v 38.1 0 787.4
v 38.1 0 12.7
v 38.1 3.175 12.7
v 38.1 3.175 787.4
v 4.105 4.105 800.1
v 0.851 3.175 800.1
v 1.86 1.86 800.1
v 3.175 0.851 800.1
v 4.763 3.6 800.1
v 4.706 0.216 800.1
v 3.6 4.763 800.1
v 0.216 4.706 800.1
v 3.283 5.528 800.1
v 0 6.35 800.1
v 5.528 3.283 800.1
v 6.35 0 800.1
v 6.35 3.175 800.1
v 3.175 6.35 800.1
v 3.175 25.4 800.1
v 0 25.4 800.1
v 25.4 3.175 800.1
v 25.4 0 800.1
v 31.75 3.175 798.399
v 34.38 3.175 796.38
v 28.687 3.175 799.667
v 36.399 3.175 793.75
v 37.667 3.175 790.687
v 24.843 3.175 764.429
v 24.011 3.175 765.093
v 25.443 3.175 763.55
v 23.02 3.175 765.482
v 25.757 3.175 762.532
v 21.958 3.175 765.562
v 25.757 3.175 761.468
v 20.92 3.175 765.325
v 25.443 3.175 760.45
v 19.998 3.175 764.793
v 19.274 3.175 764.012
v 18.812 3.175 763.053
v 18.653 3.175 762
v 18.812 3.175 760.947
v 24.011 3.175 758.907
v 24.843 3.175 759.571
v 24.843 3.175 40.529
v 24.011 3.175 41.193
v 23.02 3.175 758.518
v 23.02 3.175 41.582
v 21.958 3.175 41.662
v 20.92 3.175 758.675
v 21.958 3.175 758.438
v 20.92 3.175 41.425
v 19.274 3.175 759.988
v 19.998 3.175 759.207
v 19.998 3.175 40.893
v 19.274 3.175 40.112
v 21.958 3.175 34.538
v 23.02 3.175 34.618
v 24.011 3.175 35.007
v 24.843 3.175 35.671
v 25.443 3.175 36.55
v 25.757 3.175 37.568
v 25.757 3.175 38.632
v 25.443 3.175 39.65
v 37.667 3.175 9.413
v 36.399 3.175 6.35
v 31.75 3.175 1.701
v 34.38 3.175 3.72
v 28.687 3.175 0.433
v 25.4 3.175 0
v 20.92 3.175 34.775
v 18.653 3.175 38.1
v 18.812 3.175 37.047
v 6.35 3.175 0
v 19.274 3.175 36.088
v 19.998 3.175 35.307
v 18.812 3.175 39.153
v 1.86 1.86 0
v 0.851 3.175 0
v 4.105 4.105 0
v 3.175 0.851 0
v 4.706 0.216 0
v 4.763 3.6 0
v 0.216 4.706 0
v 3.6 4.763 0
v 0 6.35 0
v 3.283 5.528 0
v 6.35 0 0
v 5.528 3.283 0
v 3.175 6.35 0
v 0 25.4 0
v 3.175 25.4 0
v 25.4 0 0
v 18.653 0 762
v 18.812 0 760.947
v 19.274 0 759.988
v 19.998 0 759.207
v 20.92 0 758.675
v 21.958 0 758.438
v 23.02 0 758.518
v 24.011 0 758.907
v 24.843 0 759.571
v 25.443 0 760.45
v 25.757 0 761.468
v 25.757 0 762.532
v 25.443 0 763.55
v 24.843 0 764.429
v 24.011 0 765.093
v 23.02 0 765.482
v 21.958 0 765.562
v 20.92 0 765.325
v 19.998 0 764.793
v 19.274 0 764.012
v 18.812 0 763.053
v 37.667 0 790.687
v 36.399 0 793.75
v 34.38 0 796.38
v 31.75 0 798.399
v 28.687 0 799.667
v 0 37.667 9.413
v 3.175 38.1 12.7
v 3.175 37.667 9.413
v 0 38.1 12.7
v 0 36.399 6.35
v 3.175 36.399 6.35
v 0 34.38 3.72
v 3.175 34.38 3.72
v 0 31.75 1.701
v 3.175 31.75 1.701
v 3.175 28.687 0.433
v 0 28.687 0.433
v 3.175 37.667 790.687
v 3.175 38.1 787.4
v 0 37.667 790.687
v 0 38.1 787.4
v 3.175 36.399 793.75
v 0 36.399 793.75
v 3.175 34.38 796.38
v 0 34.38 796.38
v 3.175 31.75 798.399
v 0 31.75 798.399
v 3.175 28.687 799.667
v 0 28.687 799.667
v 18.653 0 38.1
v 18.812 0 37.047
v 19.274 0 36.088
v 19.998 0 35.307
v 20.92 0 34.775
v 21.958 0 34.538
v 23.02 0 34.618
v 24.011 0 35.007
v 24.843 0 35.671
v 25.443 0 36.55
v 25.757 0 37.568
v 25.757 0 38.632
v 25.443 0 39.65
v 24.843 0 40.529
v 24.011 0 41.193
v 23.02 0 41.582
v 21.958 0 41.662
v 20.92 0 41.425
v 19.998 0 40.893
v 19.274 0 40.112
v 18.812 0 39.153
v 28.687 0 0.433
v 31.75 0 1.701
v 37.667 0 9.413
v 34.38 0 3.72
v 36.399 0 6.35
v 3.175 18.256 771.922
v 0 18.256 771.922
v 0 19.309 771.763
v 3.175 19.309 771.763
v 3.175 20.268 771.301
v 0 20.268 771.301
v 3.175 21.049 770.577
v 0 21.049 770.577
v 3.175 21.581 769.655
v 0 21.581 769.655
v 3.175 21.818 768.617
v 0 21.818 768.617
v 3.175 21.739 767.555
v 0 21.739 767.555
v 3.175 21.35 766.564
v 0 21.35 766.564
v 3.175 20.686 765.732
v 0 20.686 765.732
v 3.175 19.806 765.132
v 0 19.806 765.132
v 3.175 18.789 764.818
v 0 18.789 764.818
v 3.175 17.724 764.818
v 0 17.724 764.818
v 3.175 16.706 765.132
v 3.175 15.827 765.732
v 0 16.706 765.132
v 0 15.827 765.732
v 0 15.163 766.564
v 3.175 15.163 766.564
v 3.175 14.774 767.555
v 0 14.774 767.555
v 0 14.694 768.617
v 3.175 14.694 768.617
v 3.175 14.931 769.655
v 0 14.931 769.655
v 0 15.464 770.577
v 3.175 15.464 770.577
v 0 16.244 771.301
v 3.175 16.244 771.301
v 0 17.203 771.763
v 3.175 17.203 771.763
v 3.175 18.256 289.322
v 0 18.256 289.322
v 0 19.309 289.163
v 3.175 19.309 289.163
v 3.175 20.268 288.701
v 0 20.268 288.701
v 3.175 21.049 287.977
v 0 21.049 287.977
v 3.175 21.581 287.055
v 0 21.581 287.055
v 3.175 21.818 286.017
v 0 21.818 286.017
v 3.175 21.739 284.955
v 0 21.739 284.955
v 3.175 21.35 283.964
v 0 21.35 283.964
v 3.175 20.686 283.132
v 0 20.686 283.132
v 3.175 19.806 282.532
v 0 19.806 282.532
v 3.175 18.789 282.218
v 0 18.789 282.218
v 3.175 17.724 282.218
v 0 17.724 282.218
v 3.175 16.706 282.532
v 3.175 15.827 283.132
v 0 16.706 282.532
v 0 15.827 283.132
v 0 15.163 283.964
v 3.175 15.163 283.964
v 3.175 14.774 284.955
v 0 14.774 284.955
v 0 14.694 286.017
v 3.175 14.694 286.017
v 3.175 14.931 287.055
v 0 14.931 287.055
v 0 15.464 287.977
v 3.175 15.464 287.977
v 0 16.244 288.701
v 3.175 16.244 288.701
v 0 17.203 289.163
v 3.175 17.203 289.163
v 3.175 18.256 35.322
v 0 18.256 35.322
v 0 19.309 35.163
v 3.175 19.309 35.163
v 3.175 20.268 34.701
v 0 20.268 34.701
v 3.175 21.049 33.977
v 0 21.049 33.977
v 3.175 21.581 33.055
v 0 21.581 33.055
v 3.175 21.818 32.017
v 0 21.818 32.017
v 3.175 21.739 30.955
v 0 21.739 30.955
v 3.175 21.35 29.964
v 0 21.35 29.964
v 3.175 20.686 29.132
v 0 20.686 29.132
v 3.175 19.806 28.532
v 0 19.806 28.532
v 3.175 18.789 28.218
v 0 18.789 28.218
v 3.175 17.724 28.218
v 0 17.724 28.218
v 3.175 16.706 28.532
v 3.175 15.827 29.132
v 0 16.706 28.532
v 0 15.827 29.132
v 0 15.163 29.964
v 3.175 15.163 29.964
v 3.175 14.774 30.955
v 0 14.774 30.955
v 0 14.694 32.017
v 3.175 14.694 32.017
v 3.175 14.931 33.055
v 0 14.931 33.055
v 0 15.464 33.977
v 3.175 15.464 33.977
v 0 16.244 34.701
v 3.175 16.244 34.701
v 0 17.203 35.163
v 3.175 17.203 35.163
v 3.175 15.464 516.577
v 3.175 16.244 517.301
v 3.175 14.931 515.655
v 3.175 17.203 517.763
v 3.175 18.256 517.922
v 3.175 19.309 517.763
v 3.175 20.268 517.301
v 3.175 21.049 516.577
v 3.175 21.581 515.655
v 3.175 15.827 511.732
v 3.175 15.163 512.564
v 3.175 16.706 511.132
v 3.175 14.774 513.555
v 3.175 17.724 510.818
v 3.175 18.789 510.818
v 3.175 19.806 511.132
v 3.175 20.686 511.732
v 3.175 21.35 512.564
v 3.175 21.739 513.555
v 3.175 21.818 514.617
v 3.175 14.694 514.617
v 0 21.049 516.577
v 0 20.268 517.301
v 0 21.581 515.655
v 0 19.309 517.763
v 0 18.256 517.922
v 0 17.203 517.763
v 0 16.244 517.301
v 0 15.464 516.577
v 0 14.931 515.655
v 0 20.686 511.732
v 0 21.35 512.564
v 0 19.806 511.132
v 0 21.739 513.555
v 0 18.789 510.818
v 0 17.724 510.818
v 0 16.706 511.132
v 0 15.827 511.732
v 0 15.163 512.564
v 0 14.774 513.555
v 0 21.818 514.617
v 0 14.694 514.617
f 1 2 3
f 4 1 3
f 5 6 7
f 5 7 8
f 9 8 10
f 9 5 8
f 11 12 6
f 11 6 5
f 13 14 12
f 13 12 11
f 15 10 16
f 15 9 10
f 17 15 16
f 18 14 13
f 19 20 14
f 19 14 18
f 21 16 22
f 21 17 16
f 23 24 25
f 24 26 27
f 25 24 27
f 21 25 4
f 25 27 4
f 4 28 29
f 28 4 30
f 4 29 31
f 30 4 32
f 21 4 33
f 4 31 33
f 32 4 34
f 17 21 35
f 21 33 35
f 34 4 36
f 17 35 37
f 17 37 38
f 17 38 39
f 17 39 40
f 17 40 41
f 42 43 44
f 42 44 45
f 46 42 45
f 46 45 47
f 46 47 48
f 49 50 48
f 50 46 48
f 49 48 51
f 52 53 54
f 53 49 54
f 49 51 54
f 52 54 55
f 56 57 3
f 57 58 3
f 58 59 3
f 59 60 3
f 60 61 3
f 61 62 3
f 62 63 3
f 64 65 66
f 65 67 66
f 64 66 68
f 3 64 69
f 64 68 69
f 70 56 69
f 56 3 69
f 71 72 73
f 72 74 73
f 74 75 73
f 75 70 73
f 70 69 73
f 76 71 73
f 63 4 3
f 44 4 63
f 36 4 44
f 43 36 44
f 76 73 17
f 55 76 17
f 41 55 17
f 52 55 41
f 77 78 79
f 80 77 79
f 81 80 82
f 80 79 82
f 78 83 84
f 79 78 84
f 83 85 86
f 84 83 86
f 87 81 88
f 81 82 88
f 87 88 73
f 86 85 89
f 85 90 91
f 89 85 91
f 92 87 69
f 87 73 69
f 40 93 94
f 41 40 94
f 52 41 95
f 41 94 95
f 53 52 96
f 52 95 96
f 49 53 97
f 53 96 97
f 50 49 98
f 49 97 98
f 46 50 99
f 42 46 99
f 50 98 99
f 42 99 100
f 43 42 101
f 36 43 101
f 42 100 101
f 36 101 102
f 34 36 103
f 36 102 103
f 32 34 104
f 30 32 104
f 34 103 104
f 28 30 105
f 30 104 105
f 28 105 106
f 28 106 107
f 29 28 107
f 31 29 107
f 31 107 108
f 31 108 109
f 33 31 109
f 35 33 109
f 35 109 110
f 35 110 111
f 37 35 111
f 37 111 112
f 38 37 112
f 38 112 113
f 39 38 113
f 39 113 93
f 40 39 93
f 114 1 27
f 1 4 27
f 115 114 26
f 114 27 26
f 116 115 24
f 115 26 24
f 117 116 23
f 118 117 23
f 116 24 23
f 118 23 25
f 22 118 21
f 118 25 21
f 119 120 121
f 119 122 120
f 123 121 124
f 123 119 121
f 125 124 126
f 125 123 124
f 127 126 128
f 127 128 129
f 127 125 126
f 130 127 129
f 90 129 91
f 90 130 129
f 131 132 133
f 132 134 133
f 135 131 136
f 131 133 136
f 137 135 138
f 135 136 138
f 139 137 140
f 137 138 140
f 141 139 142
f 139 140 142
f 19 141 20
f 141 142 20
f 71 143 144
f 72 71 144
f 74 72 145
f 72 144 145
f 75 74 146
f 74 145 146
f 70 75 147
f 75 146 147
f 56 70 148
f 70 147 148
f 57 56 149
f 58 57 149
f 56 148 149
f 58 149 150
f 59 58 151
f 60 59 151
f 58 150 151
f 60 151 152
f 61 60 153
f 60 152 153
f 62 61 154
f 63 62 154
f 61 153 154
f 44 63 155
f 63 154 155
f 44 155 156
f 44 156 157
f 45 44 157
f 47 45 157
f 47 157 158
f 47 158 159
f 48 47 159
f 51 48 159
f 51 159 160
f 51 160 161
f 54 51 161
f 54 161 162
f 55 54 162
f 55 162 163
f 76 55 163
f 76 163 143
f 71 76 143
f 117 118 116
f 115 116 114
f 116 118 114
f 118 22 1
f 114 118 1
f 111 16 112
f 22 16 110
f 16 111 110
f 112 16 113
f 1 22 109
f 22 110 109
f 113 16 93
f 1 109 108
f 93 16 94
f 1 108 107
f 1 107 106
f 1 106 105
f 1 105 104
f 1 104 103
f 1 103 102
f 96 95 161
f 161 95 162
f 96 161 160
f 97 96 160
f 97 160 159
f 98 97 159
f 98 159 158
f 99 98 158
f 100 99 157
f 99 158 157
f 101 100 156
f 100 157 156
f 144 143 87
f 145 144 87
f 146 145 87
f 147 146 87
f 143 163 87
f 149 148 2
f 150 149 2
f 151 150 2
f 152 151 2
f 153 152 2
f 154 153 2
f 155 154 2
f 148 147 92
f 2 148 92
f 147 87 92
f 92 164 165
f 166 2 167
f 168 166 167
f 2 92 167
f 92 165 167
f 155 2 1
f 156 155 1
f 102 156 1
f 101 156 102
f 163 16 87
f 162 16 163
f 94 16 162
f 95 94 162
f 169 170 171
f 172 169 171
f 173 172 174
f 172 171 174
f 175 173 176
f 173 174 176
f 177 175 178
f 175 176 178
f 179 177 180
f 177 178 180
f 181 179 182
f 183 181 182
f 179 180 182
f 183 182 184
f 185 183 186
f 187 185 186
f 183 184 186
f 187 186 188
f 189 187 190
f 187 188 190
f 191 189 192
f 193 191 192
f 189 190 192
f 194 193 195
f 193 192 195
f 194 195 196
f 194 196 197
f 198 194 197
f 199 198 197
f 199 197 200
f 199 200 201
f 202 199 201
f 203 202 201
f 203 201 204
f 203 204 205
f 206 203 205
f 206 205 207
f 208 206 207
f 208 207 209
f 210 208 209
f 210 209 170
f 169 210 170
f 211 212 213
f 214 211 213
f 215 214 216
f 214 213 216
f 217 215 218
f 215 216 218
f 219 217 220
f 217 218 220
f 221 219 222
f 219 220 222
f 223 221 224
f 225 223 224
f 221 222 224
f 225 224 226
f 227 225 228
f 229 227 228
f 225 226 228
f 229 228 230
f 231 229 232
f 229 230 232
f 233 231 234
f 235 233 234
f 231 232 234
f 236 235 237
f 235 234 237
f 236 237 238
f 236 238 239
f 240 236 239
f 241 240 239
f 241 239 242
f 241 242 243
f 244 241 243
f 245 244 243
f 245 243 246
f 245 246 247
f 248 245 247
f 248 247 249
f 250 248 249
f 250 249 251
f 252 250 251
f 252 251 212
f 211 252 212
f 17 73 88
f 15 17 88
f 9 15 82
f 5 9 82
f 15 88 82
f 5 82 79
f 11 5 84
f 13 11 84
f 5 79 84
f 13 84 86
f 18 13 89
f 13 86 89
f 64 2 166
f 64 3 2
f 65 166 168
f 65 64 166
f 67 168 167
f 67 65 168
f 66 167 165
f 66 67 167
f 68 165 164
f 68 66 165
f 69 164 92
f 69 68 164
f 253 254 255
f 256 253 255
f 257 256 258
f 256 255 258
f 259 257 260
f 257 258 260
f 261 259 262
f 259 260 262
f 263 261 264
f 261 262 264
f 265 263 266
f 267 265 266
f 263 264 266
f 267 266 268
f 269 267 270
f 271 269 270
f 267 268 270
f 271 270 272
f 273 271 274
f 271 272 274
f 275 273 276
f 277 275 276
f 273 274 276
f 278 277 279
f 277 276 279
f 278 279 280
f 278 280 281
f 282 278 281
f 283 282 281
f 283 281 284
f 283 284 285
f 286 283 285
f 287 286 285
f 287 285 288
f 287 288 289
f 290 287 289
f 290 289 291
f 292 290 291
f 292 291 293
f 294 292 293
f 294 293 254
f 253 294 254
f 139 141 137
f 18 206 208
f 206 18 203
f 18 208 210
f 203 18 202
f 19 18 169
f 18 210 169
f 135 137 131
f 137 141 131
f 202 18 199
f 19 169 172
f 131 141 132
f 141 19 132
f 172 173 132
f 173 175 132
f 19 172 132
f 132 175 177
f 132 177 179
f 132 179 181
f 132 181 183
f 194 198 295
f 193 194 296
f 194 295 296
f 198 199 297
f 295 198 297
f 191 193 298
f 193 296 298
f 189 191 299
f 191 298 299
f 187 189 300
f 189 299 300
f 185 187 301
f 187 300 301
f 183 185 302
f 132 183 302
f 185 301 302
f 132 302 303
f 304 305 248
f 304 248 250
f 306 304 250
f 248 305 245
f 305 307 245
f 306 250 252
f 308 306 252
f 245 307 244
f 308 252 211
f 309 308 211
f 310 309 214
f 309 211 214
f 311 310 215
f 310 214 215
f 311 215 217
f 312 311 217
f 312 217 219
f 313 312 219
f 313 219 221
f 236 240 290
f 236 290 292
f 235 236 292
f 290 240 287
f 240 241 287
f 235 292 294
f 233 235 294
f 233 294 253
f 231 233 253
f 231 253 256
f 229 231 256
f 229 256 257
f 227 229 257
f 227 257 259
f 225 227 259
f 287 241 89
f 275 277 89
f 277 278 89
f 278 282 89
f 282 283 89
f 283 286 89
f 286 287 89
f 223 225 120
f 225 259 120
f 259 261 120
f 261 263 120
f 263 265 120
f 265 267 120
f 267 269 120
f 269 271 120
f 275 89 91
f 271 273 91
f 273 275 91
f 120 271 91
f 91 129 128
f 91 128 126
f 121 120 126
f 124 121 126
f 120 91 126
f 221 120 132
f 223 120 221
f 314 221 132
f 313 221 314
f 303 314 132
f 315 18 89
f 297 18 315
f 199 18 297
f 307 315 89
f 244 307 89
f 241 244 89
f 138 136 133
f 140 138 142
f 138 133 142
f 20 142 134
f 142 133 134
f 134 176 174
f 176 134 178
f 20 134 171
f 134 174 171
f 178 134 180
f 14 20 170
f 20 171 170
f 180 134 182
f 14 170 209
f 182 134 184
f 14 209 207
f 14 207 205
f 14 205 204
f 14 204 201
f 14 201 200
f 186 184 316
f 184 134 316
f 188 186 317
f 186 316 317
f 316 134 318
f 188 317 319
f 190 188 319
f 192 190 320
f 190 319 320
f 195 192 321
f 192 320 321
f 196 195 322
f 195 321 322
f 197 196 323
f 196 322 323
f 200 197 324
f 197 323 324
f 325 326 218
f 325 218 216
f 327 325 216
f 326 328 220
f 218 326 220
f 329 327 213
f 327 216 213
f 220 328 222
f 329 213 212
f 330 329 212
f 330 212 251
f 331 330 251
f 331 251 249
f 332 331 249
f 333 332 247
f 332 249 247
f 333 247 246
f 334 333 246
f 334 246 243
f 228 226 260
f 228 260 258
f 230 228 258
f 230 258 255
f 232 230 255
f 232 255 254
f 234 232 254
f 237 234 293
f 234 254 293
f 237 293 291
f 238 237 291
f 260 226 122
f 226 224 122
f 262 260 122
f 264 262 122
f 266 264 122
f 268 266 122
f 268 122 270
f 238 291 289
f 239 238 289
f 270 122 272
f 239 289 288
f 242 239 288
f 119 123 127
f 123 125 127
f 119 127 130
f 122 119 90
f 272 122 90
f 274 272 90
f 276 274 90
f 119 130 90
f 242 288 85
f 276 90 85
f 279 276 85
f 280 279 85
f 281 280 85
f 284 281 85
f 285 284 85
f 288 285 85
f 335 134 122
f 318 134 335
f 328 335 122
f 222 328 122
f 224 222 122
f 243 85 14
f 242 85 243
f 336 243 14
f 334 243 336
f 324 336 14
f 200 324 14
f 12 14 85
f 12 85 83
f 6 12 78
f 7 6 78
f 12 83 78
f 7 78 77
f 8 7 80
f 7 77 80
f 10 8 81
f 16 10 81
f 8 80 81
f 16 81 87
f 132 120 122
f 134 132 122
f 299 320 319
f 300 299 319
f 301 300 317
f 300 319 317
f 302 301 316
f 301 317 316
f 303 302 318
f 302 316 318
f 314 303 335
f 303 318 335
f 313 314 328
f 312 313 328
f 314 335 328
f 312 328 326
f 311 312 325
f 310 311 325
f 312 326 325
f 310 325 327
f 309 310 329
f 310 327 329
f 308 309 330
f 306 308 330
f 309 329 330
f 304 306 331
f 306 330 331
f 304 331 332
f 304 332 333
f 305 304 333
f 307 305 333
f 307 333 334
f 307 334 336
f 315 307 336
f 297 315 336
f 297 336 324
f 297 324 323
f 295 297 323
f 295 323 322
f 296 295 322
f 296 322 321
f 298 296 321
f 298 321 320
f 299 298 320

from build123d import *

# Parameters (mm, degrees)
BASE_FLANGE1_DEPTH              = 800.1
FILLET1_R                       = 12.7
F_9_32_0_28125_DIAMETER_HOLE1_D = 7.14375
F_9_32_0_28125_DIAMETER_HOLE2_D = 7.14375


# Sheet-metal steps are written as plain solids
with BuildPart() as part:
    # Sketch1 → Base-Flange1 (new body)
    with BuildSketch(Plane.XY):
        with BuildLine():
            Line((0, 38.1), (0, 6.35))
            ThreePointArc((0, 6.35), (1.859871939, 1.859871939), (6.35, 0))
            Line((6.35, 0), (38.1, 0))
            Line((38.1, 0), (38.1, 3.175))
            Line((38.1, 3.175), (6.35, 3.175))
            ThreePointArc((6.35, 3.175), (4.10493597, 4.10493597), (3.175, 6.35))
            Line((3.175, 6.35), (3.175, 38.1))
            Line((3.175, 38.1), (0, 38.1))
        make_face()
    extrude(amount=BASE_FLANGE1_DEPTH)

    # Fillet1
    fillet1_edges = [part.edges().sort_by_distance(p)[0] for p in [
        (1.5875, 38.1, 800.1),
        (1.5875, 38.1, 0),
        (38.1, 1.5875, 800.1),
        (38.1, 1.5875, 0),
    ]]
    fillet(fillet1_edges, radius=FILLET1_R)

    # 9/32 (0.28125) Diameter Hole1 (through all)
    with Locations(Plane(origin=(3.175, 0, 0), x_dir=(0, 0, -1), z_dir=(1, 0, 0))):
        with Locations((-768.35, 18.25625), (-514.35, 18.25625), (-285.75, 18.25625), (-31.75, 18.25625)):
            Hole(F_9_32_0_28125_DIAMETER_HOLE1_D / 2)

    # 9/32 (0.28125) Diameter Hole2 (through all)
    with Locations(Plane(origin=(0, 3.175, 0), x_dir=(1, 0, 0), z_dir=(0, 1, 0))):
        with Locations((22.225, -38.1), (22.225, -762)):
            Hole(F_9_32_0_28125_DIAMETER_HOLE2_D / 2)


solid = part.part
